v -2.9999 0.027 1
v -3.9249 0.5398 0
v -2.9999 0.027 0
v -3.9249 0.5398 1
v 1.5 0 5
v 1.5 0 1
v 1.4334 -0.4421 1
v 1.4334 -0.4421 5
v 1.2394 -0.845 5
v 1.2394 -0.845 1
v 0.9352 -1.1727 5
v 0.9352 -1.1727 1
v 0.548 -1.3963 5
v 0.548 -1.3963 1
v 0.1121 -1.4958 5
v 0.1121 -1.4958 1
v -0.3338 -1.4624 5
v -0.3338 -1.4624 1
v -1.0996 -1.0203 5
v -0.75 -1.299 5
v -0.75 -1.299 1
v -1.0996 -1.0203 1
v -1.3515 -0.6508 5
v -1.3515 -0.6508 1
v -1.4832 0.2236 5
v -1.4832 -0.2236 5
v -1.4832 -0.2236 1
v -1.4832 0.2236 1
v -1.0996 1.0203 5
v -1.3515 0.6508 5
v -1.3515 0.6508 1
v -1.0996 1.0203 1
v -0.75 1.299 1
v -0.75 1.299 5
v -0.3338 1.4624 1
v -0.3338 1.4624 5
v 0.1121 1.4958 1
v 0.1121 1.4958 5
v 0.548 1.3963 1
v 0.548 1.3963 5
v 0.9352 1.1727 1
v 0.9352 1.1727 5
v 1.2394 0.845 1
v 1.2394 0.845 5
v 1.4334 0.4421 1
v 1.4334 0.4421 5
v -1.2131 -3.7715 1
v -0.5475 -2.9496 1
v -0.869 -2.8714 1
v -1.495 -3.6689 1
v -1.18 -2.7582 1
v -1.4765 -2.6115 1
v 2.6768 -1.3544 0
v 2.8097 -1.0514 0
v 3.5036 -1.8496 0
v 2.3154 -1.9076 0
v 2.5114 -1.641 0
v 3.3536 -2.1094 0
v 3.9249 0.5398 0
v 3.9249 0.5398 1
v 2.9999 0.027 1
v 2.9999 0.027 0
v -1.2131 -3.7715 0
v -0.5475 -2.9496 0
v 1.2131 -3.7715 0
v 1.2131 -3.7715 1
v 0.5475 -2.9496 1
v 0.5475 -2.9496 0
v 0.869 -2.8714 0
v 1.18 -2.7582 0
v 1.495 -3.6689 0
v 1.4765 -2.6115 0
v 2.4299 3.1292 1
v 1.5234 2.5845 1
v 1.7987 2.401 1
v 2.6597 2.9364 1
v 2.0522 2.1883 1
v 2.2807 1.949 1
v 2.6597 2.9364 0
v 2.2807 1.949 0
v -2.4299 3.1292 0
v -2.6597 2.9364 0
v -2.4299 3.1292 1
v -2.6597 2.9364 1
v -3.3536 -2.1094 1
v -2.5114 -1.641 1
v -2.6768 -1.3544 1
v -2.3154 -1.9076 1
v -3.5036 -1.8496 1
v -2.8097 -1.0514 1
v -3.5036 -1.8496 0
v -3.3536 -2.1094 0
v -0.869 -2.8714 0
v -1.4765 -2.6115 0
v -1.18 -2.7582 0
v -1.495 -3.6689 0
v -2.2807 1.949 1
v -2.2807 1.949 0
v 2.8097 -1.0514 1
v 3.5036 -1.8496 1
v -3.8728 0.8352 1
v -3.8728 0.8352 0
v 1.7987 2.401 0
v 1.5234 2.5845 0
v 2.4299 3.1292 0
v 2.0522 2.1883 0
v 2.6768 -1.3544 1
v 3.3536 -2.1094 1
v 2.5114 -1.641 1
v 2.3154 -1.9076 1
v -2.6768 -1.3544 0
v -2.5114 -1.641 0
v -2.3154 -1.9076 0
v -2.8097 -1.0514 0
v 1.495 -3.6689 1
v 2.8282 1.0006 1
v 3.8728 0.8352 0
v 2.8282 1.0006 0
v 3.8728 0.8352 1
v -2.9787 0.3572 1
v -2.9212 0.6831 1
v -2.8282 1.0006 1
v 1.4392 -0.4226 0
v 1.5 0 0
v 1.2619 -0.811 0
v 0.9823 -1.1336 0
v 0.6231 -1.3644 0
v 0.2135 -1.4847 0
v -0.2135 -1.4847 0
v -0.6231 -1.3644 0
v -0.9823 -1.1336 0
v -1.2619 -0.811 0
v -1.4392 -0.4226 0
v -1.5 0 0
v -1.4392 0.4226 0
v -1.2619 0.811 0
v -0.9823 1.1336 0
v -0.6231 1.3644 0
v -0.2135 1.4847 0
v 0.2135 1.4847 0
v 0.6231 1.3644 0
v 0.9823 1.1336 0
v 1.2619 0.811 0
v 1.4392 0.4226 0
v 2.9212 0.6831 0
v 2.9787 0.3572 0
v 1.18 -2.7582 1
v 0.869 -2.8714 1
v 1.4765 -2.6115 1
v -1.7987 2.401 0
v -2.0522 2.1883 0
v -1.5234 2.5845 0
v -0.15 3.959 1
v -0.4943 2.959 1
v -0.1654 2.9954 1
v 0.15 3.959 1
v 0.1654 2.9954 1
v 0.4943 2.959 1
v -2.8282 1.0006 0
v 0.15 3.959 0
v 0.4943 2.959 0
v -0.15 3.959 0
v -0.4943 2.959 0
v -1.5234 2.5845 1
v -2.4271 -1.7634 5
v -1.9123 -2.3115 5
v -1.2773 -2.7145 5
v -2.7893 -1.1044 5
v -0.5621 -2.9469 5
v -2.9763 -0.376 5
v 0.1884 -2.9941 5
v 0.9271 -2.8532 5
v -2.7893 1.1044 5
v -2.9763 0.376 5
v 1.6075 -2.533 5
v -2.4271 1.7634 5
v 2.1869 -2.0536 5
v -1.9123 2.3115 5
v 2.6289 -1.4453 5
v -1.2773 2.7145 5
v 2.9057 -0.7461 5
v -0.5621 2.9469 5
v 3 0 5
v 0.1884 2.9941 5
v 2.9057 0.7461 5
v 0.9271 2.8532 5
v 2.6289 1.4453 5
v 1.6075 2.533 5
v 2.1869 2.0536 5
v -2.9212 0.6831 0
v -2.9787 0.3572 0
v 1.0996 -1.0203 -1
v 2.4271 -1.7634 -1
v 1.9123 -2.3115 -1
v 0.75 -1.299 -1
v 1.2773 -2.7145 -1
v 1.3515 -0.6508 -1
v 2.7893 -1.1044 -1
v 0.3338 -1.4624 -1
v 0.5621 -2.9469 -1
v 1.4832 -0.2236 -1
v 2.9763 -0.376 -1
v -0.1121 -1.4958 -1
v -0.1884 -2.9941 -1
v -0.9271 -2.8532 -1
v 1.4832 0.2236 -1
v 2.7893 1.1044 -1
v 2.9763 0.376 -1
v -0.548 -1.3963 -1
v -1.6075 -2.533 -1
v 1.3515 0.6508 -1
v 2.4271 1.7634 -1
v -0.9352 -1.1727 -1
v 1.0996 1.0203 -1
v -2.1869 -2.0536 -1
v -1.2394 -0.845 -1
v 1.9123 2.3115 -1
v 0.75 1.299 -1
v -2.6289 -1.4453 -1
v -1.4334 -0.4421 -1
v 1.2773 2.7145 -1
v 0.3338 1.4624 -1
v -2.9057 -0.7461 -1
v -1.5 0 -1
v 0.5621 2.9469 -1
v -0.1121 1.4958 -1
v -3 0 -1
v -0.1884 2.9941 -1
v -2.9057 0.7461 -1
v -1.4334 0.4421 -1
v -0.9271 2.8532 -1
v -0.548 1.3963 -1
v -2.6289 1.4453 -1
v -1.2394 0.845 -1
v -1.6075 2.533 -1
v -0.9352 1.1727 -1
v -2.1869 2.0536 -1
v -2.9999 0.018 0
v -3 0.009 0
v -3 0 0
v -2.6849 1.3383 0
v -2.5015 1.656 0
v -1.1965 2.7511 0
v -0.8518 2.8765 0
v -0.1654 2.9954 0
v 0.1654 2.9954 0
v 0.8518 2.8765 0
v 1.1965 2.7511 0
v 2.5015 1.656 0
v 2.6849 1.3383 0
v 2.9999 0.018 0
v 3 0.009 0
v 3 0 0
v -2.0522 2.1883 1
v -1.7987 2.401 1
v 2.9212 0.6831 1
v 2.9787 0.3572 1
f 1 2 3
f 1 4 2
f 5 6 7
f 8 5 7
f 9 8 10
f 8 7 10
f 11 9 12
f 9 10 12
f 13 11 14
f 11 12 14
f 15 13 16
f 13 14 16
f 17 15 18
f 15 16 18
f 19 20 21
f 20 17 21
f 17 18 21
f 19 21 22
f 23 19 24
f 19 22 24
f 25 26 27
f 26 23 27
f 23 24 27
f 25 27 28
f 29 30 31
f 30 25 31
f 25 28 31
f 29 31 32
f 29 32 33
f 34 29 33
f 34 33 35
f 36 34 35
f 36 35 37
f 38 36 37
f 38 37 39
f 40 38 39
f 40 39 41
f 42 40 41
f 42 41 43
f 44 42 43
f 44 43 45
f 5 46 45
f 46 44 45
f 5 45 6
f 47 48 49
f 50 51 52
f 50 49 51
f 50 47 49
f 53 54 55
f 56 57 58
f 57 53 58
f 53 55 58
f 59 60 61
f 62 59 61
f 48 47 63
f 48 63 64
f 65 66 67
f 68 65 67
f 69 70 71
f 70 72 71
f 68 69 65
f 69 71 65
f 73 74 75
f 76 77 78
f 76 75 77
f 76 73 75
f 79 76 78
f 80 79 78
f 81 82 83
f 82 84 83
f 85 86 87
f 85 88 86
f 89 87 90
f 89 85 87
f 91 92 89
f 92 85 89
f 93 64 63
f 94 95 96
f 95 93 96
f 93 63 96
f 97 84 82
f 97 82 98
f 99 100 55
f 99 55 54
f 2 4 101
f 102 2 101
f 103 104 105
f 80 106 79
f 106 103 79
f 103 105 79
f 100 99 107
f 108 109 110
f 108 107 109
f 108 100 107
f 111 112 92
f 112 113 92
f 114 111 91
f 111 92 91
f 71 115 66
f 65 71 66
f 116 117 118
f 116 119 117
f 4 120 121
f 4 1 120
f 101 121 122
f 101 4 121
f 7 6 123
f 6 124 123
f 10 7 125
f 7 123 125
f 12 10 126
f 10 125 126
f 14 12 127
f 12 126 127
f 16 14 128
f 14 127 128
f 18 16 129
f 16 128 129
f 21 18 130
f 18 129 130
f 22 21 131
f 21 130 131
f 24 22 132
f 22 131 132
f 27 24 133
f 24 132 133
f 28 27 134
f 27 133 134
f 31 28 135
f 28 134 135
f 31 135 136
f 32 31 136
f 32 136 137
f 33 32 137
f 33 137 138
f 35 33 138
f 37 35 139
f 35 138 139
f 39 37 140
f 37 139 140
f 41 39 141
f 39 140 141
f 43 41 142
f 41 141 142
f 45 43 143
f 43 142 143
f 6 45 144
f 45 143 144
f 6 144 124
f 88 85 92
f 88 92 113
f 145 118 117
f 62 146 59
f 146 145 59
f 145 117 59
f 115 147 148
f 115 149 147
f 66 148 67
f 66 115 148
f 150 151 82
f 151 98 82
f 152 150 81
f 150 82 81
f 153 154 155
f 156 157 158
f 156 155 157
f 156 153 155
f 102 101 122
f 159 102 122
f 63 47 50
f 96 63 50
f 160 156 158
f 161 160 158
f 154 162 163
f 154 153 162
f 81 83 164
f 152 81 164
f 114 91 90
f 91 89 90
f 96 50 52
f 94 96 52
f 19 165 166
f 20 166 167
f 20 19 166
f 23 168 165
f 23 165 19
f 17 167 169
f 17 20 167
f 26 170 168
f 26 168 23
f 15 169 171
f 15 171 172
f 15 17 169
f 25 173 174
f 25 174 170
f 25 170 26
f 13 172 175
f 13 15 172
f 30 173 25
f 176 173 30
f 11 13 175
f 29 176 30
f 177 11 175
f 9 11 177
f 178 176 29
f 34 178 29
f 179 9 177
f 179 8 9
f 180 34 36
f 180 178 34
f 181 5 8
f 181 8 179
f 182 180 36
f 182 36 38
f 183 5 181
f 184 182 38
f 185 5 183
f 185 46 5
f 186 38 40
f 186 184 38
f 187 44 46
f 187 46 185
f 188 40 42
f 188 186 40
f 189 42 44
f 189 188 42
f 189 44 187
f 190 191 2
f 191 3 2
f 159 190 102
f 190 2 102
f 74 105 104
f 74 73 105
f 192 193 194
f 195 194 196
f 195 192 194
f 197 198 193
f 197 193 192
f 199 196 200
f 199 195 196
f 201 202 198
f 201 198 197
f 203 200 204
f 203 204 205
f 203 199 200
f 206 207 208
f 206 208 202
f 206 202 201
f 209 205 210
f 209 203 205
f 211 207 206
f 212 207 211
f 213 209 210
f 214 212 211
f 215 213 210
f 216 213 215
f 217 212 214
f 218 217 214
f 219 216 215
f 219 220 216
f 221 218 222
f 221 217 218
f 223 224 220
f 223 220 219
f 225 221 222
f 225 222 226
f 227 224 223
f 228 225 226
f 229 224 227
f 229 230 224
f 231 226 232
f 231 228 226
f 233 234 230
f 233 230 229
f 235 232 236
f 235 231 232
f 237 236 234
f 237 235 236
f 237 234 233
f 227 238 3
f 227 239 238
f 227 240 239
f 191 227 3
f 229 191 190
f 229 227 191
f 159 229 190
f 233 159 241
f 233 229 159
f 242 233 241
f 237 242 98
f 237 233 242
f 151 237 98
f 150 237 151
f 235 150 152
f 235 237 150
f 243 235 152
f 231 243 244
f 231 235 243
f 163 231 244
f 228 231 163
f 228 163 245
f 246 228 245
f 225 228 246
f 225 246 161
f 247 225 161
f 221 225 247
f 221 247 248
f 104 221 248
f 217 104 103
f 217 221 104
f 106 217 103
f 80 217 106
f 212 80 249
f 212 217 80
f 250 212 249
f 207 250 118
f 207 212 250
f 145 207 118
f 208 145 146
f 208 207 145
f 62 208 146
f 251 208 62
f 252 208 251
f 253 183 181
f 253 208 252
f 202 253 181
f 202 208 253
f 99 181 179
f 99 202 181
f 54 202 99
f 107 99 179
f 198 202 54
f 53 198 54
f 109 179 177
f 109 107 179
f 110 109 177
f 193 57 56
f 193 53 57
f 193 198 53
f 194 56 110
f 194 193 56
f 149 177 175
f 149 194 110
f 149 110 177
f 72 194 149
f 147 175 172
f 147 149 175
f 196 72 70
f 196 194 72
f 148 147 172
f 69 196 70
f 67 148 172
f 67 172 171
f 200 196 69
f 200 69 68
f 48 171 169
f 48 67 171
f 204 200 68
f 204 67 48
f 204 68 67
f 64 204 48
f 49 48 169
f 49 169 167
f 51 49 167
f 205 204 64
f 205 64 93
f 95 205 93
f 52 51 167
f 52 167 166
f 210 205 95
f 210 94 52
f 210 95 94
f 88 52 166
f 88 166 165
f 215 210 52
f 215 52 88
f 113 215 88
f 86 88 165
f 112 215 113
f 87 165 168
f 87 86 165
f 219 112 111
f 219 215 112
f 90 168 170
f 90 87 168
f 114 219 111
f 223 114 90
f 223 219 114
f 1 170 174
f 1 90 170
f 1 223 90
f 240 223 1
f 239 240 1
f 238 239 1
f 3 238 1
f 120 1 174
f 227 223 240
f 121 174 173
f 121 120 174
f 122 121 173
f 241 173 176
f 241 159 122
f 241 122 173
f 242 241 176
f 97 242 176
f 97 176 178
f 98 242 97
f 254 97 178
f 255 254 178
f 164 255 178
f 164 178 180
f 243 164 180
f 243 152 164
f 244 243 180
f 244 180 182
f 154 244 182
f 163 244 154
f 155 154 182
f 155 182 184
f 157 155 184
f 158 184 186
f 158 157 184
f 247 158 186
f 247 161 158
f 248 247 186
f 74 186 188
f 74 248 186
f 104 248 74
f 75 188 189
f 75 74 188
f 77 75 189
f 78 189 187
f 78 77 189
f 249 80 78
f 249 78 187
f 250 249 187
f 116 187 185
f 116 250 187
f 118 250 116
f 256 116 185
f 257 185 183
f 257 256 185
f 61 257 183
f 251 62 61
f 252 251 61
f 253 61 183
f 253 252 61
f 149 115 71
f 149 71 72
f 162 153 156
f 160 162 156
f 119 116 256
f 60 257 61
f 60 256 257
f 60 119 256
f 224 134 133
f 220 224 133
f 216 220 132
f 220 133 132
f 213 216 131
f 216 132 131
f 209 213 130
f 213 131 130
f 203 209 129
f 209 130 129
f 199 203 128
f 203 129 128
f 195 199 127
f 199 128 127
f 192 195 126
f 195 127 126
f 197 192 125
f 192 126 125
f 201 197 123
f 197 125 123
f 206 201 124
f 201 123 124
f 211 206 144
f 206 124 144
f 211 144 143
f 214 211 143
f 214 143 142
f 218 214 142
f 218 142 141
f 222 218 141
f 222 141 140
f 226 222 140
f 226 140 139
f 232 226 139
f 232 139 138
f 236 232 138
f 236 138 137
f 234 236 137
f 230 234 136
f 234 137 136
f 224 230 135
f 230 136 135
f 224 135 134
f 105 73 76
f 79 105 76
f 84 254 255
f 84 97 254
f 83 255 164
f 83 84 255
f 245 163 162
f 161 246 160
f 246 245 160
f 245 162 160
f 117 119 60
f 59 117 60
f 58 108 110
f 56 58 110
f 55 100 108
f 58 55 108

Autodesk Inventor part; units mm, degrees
ref_plane "YZ Plane" through (0, 0, 0) normal (1, 0, 0) x (0, 1, 0)
ref_plane "XZ Plane" through (0, 0, 0) normal (0, 1, 0) x (-1, 0, 0)
ref_plane "XY Plane" through (0, 0, 0) normal (0, 0, 1) x (1, 0, 0)
sketch "Sketch1" plane through (0, 0, 0) normal (0, 0, 1) x (1, 0, 0)
  circle A0 centre (0, 0) radius 3
  circle A1 centre (0, 0) radius 1.5
  dimension "d0" = 6
  dimension "d1" = 3
extrude "Extrusion1" add sketch "Sketch1" along normal blind 1
sketch "Sketch3" plane through (0, 0, 0) normal (0, 0, -1) x (-1, 0, 0)
  circle A0 centre (0, 0) radius 1.5 projected
  circle A1 centre (0, 0) radius 3 projected
extrude "Extrusion3" add sketch "Sketch3" along normal blind 1
sketch "Sketch2" plane through (0, 0, 1) normal (0, 0, 1) x (1, 0, 0)
  line L0 (0, 0) -> (0, 3.959) construction
  line L1 (-0.15, 3.959) -> (0.15, 3.959)
  line L2 (-0.4943, 2.959) -> (0.4943, 2.959)
  line L3 (-0.15, 3.959) -> (-0.4943, 2.959)
  line L4 (0.15, 3.959) -> (0.4943, 2.959)
  circle A0 centre (0, 0) radius 3 projected
  point P0 (0, 2.959)
  dimension "d4" = 1
  dimension "d5" = 0.3
  dimension "d8" = 109
extrude "Extrusion2" add sketch "Sketch2" against normal up to surface (1 mm away) separate body contours L1 L4 A0 L3 | A0 L2 picked at (-0.0551, 2.9711)
sketch "Sketch4" plane through (0, 0, 1) normal (0, 0, 1) x (1, 0, 0)
  circle A0 centre (0, 0) radius 1.5 projected
  circle A1 centre (0, 0) radius 3 projected
extrude "Extrusion4" add sketch "Sketch4" along normal blind 4 bodies 1
pattern_circular "Circular Pattern1" count 9 over 360 about axis through (0, 0, 0) along (0, 0, 1) of "Extrusion2" bodies 2
combine bodies "Combine1" operation type add bodies to combine 1 2
properties part number "ChainGear"
